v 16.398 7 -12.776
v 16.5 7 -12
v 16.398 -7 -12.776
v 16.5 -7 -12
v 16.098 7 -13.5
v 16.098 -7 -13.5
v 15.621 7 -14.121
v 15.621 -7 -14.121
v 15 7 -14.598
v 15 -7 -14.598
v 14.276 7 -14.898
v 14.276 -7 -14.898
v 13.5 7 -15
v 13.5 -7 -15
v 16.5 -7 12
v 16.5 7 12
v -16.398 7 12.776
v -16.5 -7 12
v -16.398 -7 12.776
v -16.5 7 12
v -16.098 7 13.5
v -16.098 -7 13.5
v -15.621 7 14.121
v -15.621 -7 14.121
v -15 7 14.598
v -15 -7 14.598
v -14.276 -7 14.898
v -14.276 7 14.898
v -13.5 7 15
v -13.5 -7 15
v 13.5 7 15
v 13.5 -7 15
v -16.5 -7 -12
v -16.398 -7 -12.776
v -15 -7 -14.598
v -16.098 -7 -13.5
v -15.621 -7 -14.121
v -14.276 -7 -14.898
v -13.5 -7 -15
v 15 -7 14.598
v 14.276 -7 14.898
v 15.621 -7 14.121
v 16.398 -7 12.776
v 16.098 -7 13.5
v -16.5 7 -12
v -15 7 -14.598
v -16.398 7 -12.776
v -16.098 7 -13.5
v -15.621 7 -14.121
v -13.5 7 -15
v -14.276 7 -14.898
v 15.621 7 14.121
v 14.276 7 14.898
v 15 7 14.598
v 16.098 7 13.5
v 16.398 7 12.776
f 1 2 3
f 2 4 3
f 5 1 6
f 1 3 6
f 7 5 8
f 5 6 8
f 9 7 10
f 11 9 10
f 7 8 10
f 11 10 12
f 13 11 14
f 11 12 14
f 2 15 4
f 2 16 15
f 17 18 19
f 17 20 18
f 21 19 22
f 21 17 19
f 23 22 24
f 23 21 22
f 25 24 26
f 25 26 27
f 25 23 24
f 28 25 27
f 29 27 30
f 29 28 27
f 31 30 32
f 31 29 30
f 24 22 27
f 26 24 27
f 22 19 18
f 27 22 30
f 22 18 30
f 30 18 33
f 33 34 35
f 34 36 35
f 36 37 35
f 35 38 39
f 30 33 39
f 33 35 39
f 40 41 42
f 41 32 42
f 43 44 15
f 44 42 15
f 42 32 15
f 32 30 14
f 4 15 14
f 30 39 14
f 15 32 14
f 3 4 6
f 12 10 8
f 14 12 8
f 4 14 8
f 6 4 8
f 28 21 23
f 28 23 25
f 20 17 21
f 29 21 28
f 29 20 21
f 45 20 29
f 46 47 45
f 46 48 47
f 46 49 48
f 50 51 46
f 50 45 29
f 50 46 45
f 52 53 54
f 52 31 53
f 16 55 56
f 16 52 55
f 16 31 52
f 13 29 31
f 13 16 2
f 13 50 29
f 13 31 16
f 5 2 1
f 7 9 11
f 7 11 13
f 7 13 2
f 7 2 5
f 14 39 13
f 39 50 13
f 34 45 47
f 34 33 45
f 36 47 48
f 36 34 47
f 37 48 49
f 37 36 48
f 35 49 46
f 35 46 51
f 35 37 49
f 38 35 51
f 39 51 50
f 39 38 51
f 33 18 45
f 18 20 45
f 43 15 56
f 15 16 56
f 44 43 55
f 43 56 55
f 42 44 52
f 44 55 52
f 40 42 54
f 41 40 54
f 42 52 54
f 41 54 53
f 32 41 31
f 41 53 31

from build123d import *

# Parameters (mm, degrees)
BOSS_EXTRU_1_DEPTH      = 7
BOSS_EXTRU_1_DEPTH_BACK = 7
ESQUISSE1_W             = 33
ESQUISSE1_H             = 30
CONG_1_R                = 3


with BuildPart() as part:
    # Esquisse1 → Boss.-Extru.1 (new, two sides: drawn at the far end of the back side and taken through both)
    with BuildSketch(Plane(origin=(0, 0, 0), x_dir=(1, 0, 0), z_dir=(0, 1, 0)).offset(-BOSS_EXTRU_1_DEPTH_BACK)):
        Rectangle(ESQUISSE1_W, ESQUISSE1_H)
    extrude(amount=BOSS_EXTRU_1_DEPTH + BOSS_EXTRU_1_DEPTH_BACK)

    # Congé1
    cong_1_edges = [part.edges().sort_by_distance(p)[0] for p in [
        (-16.5, 0, -15),
        (16.5, 0, -15),
        (16.5, 0, 15),
        (-16.5, 0, 15),
    ]]
    fillet(cong_1_edges, radius=CONG_1_R)


solid = part.part
